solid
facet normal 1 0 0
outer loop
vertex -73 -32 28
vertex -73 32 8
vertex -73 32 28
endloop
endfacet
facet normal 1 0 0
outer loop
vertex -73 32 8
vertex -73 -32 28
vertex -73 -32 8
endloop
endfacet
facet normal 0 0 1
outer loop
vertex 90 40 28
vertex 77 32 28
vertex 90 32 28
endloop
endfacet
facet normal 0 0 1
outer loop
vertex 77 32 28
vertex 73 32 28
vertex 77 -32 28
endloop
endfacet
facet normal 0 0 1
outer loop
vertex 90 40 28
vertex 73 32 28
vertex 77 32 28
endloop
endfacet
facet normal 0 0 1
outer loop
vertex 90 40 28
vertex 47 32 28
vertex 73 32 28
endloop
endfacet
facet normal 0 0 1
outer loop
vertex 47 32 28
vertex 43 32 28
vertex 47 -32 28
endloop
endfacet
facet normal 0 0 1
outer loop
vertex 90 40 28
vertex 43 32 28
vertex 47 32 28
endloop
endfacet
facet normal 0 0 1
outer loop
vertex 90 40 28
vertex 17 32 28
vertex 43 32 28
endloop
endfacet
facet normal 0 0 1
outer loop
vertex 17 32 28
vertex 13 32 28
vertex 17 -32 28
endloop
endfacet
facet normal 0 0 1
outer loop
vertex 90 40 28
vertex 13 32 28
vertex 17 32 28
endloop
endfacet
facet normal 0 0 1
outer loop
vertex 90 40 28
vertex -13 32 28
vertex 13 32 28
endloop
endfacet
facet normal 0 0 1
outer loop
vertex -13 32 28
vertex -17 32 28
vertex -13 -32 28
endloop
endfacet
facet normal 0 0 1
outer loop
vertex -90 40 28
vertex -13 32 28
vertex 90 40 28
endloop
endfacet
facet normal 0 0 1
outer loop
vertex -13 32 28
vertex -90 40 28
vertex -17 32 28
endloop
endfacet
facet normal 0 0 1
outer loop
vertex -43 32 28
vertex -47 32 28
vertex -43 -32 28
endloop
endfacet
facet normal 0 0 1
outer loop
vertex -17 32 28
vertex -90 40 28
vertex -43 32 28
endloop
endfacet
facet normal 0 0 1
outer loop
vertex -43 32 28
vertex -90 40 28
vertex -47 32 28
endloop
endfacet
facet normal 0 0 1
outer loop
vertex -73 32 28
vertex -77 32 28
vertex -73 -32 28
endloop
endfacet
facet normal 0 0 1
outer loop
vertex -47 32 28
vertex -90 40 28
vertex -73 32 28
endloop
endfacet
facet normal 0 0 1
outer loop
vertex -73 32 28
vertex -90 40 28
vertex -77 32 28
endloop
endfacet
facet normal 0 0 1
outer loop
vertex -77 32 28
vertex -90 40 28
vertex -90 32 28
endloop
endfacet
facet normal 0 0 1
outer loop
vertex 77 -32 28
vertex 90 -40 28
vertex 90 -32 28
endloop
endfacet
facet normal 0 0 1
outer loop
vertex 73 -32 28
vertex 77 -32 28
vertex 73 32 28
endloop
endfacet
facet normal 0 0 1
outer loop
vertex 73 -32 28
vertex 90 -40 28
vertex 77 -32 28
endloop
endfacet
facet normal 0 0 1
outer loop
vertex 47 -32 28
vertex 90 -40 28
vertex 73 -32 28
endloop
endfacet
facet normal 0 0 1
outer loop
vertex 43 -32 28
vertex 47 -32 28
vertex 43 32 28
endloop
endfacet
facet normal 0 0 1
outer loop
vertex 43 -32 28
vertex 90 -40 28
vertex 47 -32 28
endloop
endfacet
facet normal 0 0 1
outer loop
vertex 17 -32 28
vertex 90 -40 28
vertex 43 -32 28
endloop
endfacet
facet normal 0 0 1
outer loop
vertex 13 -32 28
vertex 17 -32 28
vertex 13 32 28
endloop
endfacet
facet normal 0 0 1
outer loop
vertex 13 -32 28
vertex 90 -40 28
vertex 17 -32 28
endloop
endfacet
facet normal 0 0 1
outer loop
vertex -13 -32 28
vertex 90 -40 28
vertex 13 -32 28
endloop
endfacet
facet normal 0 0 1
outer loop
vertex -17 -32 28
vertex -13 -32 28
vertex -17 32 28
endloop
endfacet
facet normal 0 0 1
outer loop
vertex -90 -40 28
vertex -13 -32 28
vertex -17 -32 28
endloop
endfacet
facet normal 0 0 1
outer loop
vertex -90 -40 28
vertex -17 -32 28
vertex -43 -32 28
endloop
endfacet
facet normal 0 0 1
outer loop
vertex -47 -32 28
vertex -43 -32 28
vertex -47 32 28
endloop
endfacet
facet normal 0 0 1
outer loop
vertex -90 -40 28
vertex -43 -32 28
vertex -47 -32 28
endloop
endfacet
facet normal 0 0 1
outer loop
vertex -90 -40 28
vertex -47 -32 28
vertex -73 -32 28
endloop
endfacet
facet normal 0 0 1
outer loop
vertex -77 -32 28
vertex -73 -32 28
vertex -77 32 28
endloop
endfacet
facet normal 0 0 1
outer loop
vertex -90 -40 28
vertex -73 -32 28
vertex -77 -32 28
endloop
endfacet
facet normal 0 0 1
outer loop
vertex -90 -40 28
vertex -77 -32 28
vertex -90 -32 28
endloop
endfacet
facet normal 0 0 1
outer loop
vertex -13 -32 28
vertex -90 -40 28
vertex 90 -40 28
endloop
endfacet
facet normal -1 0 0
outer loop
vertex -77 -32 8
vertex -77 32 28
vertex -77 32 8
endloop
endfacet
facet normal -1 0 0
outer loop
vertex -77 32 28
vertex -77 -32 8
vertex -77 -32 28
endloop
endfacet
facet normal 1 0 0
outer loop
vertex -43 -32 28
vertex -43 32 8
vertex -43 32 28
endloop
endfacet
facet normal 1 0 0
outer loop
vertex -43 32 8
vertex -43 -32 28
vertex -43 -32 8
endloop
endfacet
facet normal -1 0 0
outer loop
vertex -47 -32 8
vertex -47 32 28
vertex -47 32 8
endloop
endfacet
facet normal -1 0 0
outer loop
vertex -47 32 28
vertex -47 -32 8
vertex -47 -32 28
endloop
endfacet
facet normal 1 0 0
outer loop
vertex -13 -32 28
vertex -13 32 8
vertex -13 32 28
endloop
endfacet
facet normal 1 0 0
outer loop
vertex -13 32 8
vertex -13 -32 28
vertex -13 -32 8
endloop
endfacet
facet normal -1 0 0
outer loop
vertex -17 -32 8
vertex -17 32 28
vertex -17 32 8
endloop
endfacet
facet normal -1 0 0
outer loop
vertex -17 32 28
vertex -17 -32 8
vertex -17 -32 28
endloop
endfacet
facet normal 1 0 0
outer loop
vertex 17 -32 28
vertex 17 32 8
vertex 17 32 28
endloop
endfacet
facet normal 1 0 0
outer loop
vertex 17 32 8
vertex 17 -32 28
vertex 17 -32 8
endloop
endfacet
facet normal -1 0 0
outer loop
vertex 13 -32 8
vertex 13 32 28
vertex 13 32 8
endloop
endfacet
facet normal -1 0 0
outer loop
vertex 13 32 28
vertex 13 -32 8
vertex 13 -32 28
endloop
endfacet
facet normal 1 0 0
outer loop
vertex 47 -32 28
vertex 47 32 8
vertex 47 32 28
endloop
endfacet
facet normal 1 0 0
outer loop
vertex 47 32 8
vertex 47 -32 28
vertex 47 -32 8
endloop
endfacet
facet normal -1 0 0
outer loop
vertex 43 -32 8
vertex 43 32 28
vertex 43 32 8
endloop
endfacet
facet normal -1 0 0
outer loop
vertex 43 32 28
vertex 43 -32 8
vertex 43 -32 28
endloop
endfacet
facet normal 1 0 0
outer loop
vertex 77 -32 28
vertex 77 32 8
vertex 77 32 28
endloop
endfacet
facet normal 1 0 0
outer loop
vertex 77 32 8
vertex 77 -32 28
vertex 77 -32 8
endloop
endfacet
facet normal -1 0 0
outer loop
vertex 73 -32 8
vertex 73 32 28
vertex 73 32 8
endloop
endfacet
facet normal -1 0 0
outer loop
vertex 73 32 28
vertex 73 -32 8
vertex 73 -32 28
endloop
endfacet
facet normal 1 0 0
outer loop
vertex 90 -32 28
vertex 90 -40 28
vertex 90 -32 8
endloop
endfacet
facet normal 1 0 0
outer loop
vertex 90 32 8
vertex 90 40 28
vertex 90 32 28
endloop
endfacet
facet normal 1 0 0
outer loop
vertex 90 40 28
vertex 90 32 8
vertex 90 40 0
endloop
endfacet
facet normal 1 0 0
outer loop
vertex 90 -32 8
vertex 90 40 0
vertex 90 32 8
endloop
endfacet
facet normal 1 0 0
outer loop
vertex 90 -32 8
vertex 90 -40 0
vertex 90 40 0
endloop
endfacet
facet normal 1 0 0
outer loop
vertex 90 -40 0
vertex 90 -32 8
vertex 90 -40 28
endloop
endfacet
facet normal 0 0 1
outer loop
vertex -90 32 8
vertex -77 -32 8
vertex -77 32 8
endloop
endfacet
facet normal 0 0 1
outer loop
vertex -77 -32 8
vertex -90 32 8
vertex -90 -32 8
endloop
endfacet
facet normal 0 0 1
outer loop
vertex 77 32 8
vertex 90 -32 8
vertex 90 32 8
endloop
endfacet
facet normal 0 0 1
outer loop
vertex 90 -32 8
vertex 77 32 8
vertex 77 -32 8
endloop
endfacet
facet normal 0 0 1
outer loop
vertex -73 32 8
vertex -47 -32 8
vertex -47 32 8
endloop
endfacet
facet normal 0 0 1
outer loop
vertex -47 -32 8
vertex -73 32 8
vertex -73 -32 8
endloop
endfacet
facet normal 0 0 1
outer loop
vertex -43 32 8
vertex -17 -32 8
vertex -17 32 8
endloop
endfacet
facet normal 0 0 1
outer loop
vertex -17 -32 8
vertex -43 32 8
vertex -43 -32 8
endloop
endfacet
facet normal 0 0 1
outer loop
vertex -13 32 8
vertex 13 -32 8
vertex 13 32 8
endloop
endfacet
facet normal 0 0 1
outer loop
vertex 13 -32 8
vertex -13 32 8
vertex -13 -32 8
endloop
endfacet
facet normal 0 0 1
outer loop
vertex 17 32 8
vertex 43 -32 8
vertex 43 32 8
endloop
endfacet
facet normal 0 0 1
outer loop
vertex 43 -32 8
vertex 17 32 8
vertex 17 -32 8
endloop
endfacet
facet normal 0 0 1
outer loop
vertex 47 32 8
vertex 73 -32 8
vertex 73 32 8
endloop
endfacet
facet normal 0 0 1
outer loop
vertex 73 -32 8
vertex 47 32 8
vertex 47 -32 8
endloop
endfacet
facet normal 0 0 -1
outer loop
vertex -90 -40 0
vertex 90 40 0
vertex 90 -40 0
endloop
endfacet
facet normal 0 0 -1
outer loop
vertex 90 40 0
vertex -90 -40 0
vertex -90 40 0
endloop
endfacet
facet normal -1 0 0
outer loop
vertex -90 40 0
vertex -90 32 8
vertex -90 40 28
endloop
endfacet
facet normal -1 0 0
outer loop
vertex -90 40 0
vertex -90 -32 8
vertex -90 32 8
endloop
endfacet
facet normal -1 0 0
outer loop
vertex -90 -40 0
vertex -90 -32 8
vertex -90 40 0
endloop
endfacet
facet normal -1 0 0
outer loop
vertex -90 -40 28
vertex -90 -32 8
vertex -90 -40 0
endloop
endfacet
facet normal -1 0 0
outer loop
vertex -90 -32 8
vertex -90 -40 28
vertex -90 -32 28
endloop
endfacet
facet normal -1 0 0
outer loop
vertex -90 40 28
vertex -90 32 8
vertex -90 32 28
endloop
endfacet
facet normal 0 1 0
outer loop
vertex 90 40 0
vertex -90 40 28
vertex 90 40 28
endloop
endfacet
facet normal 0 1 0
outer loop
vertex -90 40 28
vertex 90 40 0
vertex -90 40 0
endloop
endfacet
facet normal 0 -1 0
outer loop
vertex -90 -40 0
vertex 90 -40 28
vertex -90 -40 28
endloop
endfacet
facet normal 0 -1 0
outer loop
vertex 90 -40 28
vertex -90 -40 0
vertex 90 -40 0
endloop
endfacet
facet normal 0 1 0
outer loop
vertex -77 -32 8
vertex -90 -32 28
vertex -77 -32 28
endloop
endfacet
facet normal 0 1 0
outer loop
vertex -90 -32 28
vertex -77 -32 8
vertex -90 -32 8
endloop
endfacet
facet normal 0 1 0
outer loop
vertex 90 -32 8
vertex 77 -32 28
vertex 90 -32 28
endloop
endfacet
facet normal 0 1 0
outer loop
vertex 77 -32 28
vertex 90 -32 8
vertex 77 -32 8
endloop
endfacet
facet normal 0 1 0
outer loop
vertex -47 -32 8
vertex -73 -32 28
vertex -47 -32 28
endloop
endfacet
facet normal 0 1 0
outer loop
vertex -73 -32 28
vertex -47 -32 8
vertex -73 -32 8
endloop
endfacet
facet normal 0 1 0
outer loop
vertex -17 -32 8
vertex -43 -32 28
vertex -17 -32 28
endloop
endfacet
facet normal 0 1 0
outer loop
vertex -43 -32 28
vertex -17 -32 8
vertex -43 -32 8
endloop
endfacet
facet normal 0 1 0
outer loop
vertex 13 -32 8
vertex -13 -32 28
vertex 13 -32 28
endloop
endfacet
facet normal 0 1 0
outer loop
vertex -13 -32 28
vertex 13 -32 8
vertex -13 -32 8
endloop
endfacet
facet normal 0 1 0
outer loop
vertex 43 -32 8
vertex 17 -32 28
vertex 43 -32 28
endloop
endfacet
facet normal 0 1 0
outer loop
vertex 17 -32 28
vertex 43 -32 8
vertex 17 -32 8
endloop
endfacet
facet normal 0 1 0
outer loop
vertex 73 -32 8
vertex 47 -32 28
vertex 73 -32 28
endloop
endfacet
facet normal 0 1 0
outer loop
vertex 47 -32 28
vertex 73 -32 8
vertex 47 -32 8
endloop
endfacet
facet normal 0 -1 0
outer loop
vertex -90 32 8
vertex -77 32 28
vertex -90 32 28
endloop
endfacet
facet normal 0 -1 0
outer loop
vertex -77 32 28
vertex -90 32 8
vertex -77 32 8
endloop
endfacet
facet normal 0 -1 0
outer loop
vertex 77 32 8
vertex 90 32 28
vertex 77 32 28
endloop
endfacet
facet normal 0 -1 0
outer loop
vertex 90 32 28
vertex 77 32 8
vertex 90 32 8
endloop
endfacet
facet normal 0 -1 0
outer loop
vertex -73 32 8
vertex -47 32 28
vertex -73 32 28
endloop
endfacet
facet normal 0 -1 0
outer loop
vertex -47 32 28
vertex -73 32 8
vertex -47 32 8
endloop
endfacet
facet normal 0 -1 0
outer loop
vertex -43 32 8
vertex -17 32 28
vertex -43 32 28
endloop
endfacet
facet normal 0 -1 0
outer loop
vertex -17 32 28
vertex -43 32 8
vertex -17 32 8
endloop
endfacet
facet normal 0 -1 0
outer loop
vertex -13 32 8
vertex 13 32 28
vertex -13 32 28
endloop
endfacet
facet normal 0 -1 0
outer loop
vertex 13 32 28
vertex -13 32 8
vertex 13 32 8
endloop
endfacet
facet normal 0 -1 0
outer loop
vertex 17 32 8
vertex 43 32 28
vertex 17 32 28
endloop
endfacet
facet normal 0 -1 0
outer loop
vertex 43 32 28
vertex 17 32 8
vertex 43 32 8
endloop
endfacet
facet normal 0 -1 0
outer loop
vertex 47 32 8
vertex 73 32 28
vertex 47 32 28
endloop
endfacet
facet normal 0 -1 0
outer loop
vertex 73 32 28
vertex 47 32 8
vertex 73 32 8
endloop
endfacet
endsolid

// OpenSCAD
$fn = 32;

// ----------------------------------------------------------------------
// Rib frame 180 x 80 x 28
// 6 ribs at 30 mm pitch
// ----------------------------------------------------------------------

// --- parameters (mm) ---
frame = [180, 80, 8];  // base plate size (x, y, z)
rail_w = 8;            // side rail width
ribs = 6;              // number of ribs
rib_t = 4;             // rib thickness
rib_h = 20;            // rib height above the base plate
pitch = 30;            // pitch between rib centres

// --- derived feature positions (mm) ---
span = (ribs - 1) * pitch;          // = 150   distance between the outer ribs
origin_x = -span / 2;               // = -75   X of the first rib
rib_len = frame[1] - 2 * rail_w + 2;  // = 66   rib length, 1 mm into each rail
feature_centers = [
  [origin_x + 0 * pitch, 0],
  [origin_x + 1 * pitch, 0],
  [origin_x + 2 * pitch, 0],
  [origin_x + 3 * pitch, 0],
  [origin_x + 4 * pitch, 0],
  [origin_x + 5 * pitch, 0]
];   // rib centre line, drives the rib loop

// base plate, two side rails, then the ribs read straight off feature_centers
union() {
  translate([-frame[0] / 2, -frame[1] / 2, 0]) cube(frame);
  translate([-frame[0] / 2, -frame[1] / 2, 0]) cube([frame[0], rail_w, frame[2] + rib_h]);
  translate([-frame[0] / 2, frame[1] / 2 - rail_w, 0]) cube([frame[0], rail_w, frame[2] + rib_h]);
  for (centre = feature_centers)
    translate([centre[0] - rib_t / 2, centre[1] - rib_len / 2, frame[2] - 1])
      cube([rib_t, rib_len, rib_h + 1]);
}
